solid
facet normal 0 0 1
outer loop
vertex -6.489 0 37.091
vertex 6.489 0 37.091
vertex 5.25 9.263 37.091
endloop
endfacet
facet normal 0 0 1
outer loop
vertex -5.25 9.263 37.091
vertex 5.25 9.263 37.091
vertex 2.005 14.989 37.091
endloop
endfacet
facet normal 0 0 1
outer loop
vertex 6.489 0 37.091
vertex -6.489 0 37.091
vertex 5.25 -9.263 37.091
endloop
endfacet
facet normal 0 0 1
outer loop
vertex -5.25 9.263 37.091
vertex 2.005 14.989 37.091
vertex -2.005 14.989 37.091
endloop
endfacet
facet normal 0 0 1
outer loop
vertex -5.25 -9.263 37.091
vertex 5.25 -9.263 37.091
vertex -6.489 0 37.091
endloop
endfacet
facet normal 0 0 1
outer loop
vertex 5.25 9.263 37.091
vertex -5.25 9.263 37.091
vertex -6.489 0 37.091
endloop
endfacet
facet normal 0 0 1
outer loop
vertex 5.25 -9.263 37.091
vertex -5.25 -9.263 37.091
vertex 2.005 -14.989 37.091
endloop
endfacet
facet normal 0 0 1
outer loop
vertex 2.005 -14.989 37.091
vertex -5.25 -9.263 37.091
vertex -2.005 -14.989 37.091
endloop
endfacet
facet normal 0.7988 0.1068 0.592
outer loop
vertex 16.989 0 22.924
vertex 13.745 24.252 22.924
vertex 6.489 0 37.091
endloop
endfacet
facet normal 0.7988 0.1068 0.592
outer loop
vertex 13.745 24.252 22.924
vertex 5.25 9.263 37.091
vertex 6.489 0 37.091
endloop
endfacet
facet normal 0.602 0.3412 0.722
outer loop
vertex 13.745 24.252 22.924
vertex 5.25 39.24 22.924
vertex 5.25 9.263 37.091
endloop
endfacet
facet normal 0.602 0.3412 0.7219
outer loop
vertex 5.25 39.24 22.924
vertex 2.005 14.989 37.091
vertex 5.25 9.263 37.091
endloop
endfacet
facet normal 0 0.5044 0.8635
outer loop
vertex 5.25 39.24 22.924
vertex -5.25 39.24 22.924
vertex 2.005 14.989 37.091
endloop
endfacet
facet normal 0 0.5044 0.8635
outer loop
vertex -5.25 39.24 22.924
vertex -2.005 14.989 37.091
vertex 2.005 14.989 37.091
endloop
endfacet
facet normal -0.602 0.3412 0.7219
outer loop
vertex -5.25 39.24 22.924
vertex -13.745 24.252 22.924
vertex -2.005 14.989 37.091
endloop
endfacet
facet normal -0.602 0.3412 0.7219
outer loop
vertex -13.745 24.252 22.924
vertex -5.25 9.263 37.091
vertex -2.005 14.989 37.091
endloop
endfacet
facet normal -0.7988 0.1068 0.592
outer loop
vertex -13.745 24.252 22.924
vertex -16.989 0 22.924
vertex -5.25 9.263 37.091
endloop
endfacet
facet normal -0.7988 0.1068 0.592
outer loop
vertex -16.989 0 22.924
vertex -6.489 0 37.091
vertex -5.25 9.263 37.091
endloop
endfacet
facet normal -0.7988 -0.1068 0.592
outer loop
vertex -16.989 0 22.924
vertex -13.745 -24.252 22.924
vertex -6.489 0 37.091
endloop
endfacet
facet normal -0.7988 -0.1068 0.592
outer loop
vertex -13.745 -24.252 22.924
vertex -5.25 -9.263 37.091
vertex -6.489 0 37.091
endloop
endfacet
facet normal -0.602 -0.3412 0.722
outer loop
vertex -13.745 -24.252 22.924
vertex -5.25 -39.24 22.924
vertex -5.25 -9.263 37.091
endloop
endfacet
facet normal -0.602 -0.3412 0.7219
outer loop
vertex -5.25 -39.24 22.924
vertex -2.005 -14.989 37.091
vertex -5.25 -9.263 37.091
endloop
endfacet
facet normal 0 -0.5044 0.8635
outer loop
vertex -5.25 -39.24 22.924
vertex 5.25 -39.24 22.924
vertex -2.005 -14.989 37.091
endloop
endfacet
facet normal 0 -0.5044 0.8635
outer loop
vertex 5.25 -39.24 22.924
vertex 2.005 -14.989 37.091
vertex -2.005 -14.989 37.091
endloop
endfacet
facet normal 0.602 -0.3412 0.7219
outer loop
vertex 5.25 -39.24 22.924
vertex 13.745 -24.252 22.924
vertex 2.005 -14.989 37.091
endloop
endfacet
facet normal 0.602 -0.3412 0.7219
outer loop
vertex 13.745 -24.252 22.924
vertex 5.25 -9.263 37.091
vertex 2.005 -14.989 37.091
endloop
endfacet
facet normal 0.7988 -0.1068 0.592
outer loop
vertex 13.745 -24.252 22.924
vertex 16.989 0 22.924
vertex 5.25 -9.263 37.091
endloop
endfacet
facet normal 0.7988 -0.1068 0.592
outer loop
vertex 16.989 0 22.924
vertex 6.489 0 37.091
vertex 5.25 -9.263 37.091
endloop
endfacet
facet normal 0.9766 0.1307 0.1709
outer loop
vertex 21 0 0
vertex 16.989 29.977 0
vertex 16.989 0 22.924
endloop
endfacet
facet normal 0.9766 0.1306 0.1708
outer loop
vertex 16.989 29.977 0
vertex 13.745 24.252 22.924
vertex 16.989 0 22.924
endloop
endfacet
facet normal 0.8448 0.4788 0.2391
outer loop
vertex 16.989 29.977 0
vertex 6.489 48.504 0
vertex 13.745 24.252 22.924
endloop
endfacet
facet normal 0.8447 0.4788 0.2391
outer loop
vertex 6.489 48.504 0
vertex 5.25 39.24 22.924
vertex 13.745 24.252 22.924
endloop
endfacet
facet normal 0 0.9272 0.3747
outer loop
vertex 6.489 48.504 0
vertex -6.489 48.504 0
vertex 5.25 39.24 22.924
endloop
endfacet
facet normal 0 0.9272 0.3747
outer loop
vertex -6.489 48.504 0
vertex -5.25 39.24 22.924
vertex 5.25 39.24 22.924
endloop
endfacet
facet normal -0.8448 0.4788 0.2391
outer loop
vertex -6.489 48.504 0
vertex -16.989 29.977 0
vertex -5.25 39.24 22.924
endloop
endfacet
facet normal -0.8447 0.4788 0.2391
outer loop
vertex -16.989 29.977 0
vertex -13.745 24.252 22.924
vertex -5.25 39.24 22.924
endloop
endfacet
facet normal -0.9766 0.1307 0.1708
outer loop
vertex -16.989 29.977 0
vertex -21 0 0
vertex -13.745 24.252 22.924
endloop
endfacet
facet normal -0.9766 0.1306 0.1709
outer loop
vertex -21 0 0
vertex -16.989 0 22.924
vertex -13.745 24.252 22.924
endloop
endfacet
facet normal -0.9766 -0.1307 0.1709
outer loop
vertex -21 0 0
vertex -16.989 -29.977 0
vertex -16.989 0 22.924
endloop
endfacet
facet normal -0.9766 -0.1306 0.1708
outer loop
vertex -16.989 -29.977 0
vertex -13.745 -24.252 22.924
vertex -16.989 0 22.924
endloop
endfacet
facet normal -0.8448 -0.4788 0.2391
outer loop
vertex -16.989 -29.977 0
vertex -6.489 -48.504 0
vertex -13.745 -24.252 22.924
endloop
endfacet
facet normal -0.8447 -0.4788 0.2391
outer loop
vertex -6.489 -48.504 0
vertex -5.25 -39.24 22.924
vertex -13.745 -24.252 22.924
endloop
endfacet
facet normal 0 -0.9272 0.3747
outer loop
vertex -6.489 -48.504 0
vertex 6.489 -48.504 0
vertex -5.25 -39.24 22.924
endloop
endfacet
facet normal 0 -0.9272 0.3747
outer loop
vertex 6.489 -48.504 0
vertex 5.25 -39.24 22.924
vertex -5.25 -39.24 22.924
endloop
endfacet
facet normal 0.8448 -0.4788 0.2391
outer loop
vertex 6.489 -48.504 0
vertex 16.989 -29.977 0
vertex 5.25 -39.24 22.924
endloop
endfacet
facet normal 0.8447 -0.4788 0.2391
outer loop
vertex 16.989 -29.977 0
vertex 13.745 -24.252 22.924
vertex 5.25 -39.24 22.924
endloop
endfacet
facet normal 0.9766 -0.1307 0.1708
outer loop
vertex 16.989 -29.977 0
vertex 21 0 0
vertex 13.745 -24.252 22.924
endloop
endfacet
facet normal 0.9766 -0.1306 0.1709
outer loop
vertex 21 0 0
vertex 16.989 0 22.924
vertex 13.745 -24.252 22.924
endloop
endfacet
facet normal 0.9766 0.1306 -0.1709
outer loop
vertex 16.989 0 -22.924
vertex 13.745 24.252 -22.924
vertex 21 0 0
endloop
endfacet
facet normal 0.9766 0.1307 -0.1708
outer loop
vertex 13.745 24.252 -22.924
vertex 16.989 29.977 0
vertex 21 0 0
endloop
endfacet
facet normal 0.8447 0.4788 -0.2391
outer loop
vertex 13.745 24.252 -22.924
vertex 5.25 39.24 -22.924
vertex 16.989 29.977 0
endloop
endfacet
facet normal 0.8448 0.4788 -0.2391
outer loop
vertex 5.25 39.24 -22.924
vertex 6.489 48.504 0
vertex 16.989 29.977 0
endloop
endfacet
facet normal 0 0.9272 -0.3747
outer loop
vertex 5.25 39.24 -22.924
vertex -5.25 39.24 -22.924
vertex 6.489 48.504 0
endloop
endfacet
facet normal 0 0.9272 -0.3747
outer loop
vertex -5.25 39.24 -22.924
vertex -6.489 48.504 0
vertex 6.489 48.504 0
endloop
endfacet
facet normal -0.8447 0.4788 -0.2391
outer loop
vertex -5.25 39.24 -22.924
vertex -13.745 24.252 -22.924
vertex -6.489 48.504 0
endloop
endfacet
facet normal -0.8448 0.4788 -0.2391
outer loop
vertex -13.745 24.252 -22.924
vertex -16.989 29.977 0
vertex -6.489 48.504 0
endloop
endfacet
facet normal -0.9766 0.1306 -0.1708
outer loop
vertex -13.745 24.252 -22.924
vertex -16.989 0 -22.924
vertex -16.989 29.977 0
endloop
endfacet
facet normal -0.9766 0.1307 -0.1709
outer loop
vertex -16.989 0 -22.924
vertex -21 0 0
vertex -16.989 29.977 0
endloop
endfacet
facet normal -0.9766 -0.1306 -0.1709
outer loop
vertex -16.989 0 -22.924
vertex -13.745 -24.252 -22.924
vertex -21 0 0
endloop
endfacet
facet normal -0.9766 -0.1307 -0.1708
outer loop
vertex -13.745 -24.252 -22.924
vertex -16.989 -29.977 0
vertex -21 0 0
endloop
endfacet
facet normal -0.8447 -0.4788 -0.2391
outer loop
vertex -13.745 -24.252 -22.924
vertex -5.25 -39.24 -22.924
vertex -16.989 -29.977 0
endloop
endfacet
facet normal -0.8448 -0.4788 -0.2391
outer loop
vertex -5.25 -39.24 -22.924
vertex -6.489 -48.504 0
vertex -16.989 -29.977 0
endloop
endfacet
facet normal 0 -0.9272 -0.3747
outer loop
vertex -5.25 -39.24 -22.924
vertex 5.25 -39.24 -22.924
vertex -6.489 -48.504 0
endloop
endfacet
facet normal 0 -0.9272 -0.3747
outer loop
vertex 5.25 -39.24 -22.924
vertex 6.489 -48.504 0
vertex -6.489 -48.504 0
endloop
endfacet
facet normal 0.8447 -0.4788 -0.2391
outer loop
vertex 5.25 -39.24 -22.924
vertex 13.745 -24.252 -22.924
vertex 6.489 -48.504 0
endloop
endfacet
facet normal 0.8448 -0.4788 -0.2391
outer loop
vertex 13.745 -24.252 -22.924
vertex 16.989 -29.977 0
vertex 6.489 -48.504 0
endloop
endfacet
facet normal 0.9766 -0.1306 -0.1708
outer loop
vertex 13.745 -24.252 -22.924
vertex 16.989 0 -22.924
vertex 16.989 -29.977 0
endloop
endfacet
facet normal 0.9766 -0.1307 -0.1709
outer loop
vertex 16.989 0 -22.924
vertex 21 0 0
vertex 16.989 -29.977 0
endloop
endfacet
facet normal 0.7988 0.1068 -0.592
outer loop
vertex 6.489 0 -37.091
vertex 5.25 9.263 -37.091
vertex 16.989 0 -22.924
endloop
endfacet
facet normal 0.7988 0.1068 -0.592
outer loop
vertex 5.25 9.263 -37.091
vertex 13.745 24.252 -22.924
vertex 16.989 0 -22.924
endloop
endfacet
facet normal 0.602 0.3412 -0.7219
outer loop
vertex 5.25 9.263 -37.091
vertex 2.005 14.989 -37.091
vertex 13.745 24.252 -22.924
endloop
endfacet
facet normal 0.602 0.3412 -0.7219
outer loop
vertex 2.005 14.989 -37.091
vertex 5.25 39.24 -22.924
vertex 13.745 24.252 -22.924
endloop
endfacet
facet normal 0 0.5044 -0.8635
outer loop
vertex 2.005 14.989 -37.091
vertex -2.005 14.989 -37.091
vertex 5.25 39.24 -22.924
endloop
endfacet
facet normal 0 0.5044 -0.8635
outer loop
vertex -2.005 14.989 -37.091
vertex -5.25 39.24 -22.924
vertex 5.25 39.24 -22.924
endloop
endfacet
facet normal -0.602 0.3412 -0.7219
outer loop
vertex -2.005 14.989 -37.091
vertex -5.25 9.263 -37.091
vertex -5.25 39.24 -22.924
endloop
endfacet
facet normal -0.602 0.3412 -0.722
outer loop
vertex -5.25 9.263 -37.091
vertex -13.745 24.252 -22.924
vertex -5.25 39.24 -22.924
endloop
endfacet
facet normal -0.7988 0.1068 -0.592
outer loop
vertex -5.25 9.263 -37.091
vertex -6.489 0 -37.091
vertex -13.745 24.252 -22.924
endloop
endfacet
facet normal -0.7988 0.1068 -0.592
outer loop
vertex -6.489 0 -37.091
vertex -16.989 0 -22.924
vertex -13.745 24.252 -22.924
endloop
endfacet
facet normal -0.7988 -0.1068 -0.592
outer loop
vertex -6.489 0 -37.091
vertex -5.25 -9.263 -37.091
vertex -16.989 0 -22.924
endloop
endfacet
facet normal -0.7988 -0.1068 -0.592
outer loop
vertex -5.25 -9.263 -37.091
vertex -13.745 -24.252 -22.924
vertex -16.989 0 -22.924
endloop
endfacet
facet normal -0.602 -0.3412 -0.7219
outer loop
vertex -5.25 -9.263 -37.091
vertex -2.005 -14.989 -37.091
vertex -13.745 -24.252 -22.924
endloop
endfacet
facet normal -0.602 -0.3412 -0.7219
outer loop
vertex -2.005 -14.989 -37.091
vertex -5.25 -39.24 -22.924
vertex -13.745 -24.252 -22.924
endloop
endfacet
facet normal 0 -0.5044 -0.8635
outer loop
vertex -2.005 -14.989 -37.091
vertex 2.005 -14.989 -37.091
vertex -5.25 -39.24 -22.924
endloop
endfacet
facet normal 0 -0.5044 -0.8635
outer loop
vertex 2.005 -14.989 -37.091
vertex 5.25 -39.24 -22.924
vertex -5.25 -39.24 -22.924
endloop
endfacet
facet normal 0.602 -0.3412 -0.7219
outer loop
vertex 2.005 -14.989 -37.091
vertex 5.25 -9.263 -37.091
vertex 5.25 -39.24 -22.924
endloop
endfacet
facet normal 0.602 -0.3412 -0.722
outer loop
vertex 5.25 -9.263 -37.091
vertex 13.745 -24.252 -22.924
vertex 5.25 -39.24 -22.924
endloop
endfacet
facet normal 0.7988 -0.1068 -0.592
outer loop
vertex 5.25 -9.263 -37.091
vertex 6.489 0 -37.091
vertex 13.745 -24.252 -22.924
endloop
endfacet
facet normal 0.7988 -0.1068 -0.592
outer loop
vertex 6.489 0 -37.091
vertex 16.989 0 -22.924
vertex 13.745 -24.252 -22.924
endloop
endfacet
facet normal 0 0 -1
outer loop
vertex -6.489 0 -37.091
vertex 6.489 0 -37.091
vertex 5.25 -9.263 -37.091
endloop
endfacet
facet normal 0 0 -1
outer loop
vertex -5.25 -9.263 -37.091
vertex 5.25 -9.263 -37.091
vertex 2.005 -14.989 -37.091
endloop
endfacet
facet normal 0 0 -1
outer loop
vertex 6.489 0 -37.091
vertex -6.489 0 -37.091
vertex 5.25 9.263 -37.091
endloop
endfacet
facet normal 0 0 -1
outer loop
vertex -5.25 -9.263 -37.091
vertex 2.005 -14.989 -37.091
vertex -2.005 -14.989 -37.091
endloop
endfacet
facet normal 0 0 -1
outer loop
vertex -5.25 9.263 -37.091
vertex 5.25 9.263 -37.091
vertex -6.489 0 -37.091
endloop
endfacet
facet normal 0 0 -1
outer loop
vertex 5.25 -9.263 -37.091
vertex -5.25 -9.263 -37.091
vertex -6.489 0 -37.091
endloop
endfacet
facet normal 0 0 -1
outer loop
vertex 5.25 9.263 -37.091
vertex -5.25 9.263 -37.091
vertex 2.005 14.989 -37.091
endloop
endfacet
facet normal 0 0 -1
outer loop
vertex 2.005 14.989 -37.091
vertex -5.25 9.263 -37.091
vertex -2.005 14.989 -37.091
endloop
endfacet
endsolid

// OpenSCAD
// Generated by SolidPython 1.0.1 on 2020-07-29 00:46:48


scale(v = [7, 17, 13]) {
	sphere(r = 3);
}
/***********************************************
*********      SolidPython code:      **********
************************************************
 
# import packages: SolidPython
from solid import *
from solid.utils import *
from itertools import chain, combinations, permutations


class Resize:

    def __init__(self, scad_file):
        self.scad_file = scad_file
        #self.scad_file = import_scad(scad_file)
        # cone/cylinder param:
        self.r1 = 0
        self.r2 = 0
        self.h = 0
        # rectangular prism param:
        self.w = 0
        self.l = 0
        # ellipse param:
        self.r = 0

    # import OpenScad code (file name corresponds to shape)


    # classify shape + parameters
    def assign(self, param1, param2, param3):
        if self.scad_file == 'cone.scad':
            self.r1 = param1
            self.r2 = param2
            self.h = param3
        elif self.scad_file == 'cylinder.scad':
            self.r1 = param1
            self.r2 = param2
            self.h = param3
        elif self.scad_file == 'rectangularPrism.scad':
            self.h = param1
            self.l = param2
            self.w = param3
        else:
            self.r = param1
            self.h = param2

    # resize parameters
    def iterate(self):
        x = range(3, 20, 2)
        i = 1
        if self.scad_file == 'cone.scad':
            tempList = list(permutations(x, 2))
            for temp in tempList:
                param1 = temp[0]
                param2 = temp[1]
                filepath = 'produced_scad_files/' + 'cone' + str(param1) + '_' + str(param2) + '_' + '.scad'
                scad_render_to_file(cylinder(h=param1, r1=param2, r2=0), filepath)

        elif self.scad_file == 'cylinder.scad':
            tempList = list(permutations(x, 3))
            for temp in tempList:
                param1 = temp[0]
                param2 = temp[1]
                filepath = 'produced_scad_files/' + 'cylinder' + str(param1) + '_' + str(param2) + '_' + '.scad'
                scad_render_to_file(cylinder(h=param1, r1=param2, r2=param2), filepath)

        elif self.scad_file == 'rectangularPrism.scad':
            tempList = list(permutations(x, 3))
            for temp in tempList:
                param1 = temp[0]
                param2 = temp[1]
                param3 = temp[2]
                filepath = 'produced_scad_files/' + 'rectangularPrism' + str(param1) + '_' + str(param2) + '_' + str(
                    param3) + '.scad'
                scad_render_to_file(cube(size=(param1, param2, param3)), filepath)

        elif self.scad_file == 'ellipse.scad':
            tempList = list(permutations(x, 4))
            for temp in tempList:
                param1 = temp[0]
                param2 = temp[1]
                param3 = temp[2]
                param4 = temp[3]
                filepath = 'produced_scad_files/' + 'ellipse' + str(param1) + '_' + str(param2) + '_' + str(param3) + '_' + str(param4) + '.scad'
                scad_render_to_file(scale([param1, param2, param3])(sphere(r=param4)), filepath)

    def render_to_scadfile(self):
        scad_render_to_file(scad, 'example.scad') 
 
************************************************/
